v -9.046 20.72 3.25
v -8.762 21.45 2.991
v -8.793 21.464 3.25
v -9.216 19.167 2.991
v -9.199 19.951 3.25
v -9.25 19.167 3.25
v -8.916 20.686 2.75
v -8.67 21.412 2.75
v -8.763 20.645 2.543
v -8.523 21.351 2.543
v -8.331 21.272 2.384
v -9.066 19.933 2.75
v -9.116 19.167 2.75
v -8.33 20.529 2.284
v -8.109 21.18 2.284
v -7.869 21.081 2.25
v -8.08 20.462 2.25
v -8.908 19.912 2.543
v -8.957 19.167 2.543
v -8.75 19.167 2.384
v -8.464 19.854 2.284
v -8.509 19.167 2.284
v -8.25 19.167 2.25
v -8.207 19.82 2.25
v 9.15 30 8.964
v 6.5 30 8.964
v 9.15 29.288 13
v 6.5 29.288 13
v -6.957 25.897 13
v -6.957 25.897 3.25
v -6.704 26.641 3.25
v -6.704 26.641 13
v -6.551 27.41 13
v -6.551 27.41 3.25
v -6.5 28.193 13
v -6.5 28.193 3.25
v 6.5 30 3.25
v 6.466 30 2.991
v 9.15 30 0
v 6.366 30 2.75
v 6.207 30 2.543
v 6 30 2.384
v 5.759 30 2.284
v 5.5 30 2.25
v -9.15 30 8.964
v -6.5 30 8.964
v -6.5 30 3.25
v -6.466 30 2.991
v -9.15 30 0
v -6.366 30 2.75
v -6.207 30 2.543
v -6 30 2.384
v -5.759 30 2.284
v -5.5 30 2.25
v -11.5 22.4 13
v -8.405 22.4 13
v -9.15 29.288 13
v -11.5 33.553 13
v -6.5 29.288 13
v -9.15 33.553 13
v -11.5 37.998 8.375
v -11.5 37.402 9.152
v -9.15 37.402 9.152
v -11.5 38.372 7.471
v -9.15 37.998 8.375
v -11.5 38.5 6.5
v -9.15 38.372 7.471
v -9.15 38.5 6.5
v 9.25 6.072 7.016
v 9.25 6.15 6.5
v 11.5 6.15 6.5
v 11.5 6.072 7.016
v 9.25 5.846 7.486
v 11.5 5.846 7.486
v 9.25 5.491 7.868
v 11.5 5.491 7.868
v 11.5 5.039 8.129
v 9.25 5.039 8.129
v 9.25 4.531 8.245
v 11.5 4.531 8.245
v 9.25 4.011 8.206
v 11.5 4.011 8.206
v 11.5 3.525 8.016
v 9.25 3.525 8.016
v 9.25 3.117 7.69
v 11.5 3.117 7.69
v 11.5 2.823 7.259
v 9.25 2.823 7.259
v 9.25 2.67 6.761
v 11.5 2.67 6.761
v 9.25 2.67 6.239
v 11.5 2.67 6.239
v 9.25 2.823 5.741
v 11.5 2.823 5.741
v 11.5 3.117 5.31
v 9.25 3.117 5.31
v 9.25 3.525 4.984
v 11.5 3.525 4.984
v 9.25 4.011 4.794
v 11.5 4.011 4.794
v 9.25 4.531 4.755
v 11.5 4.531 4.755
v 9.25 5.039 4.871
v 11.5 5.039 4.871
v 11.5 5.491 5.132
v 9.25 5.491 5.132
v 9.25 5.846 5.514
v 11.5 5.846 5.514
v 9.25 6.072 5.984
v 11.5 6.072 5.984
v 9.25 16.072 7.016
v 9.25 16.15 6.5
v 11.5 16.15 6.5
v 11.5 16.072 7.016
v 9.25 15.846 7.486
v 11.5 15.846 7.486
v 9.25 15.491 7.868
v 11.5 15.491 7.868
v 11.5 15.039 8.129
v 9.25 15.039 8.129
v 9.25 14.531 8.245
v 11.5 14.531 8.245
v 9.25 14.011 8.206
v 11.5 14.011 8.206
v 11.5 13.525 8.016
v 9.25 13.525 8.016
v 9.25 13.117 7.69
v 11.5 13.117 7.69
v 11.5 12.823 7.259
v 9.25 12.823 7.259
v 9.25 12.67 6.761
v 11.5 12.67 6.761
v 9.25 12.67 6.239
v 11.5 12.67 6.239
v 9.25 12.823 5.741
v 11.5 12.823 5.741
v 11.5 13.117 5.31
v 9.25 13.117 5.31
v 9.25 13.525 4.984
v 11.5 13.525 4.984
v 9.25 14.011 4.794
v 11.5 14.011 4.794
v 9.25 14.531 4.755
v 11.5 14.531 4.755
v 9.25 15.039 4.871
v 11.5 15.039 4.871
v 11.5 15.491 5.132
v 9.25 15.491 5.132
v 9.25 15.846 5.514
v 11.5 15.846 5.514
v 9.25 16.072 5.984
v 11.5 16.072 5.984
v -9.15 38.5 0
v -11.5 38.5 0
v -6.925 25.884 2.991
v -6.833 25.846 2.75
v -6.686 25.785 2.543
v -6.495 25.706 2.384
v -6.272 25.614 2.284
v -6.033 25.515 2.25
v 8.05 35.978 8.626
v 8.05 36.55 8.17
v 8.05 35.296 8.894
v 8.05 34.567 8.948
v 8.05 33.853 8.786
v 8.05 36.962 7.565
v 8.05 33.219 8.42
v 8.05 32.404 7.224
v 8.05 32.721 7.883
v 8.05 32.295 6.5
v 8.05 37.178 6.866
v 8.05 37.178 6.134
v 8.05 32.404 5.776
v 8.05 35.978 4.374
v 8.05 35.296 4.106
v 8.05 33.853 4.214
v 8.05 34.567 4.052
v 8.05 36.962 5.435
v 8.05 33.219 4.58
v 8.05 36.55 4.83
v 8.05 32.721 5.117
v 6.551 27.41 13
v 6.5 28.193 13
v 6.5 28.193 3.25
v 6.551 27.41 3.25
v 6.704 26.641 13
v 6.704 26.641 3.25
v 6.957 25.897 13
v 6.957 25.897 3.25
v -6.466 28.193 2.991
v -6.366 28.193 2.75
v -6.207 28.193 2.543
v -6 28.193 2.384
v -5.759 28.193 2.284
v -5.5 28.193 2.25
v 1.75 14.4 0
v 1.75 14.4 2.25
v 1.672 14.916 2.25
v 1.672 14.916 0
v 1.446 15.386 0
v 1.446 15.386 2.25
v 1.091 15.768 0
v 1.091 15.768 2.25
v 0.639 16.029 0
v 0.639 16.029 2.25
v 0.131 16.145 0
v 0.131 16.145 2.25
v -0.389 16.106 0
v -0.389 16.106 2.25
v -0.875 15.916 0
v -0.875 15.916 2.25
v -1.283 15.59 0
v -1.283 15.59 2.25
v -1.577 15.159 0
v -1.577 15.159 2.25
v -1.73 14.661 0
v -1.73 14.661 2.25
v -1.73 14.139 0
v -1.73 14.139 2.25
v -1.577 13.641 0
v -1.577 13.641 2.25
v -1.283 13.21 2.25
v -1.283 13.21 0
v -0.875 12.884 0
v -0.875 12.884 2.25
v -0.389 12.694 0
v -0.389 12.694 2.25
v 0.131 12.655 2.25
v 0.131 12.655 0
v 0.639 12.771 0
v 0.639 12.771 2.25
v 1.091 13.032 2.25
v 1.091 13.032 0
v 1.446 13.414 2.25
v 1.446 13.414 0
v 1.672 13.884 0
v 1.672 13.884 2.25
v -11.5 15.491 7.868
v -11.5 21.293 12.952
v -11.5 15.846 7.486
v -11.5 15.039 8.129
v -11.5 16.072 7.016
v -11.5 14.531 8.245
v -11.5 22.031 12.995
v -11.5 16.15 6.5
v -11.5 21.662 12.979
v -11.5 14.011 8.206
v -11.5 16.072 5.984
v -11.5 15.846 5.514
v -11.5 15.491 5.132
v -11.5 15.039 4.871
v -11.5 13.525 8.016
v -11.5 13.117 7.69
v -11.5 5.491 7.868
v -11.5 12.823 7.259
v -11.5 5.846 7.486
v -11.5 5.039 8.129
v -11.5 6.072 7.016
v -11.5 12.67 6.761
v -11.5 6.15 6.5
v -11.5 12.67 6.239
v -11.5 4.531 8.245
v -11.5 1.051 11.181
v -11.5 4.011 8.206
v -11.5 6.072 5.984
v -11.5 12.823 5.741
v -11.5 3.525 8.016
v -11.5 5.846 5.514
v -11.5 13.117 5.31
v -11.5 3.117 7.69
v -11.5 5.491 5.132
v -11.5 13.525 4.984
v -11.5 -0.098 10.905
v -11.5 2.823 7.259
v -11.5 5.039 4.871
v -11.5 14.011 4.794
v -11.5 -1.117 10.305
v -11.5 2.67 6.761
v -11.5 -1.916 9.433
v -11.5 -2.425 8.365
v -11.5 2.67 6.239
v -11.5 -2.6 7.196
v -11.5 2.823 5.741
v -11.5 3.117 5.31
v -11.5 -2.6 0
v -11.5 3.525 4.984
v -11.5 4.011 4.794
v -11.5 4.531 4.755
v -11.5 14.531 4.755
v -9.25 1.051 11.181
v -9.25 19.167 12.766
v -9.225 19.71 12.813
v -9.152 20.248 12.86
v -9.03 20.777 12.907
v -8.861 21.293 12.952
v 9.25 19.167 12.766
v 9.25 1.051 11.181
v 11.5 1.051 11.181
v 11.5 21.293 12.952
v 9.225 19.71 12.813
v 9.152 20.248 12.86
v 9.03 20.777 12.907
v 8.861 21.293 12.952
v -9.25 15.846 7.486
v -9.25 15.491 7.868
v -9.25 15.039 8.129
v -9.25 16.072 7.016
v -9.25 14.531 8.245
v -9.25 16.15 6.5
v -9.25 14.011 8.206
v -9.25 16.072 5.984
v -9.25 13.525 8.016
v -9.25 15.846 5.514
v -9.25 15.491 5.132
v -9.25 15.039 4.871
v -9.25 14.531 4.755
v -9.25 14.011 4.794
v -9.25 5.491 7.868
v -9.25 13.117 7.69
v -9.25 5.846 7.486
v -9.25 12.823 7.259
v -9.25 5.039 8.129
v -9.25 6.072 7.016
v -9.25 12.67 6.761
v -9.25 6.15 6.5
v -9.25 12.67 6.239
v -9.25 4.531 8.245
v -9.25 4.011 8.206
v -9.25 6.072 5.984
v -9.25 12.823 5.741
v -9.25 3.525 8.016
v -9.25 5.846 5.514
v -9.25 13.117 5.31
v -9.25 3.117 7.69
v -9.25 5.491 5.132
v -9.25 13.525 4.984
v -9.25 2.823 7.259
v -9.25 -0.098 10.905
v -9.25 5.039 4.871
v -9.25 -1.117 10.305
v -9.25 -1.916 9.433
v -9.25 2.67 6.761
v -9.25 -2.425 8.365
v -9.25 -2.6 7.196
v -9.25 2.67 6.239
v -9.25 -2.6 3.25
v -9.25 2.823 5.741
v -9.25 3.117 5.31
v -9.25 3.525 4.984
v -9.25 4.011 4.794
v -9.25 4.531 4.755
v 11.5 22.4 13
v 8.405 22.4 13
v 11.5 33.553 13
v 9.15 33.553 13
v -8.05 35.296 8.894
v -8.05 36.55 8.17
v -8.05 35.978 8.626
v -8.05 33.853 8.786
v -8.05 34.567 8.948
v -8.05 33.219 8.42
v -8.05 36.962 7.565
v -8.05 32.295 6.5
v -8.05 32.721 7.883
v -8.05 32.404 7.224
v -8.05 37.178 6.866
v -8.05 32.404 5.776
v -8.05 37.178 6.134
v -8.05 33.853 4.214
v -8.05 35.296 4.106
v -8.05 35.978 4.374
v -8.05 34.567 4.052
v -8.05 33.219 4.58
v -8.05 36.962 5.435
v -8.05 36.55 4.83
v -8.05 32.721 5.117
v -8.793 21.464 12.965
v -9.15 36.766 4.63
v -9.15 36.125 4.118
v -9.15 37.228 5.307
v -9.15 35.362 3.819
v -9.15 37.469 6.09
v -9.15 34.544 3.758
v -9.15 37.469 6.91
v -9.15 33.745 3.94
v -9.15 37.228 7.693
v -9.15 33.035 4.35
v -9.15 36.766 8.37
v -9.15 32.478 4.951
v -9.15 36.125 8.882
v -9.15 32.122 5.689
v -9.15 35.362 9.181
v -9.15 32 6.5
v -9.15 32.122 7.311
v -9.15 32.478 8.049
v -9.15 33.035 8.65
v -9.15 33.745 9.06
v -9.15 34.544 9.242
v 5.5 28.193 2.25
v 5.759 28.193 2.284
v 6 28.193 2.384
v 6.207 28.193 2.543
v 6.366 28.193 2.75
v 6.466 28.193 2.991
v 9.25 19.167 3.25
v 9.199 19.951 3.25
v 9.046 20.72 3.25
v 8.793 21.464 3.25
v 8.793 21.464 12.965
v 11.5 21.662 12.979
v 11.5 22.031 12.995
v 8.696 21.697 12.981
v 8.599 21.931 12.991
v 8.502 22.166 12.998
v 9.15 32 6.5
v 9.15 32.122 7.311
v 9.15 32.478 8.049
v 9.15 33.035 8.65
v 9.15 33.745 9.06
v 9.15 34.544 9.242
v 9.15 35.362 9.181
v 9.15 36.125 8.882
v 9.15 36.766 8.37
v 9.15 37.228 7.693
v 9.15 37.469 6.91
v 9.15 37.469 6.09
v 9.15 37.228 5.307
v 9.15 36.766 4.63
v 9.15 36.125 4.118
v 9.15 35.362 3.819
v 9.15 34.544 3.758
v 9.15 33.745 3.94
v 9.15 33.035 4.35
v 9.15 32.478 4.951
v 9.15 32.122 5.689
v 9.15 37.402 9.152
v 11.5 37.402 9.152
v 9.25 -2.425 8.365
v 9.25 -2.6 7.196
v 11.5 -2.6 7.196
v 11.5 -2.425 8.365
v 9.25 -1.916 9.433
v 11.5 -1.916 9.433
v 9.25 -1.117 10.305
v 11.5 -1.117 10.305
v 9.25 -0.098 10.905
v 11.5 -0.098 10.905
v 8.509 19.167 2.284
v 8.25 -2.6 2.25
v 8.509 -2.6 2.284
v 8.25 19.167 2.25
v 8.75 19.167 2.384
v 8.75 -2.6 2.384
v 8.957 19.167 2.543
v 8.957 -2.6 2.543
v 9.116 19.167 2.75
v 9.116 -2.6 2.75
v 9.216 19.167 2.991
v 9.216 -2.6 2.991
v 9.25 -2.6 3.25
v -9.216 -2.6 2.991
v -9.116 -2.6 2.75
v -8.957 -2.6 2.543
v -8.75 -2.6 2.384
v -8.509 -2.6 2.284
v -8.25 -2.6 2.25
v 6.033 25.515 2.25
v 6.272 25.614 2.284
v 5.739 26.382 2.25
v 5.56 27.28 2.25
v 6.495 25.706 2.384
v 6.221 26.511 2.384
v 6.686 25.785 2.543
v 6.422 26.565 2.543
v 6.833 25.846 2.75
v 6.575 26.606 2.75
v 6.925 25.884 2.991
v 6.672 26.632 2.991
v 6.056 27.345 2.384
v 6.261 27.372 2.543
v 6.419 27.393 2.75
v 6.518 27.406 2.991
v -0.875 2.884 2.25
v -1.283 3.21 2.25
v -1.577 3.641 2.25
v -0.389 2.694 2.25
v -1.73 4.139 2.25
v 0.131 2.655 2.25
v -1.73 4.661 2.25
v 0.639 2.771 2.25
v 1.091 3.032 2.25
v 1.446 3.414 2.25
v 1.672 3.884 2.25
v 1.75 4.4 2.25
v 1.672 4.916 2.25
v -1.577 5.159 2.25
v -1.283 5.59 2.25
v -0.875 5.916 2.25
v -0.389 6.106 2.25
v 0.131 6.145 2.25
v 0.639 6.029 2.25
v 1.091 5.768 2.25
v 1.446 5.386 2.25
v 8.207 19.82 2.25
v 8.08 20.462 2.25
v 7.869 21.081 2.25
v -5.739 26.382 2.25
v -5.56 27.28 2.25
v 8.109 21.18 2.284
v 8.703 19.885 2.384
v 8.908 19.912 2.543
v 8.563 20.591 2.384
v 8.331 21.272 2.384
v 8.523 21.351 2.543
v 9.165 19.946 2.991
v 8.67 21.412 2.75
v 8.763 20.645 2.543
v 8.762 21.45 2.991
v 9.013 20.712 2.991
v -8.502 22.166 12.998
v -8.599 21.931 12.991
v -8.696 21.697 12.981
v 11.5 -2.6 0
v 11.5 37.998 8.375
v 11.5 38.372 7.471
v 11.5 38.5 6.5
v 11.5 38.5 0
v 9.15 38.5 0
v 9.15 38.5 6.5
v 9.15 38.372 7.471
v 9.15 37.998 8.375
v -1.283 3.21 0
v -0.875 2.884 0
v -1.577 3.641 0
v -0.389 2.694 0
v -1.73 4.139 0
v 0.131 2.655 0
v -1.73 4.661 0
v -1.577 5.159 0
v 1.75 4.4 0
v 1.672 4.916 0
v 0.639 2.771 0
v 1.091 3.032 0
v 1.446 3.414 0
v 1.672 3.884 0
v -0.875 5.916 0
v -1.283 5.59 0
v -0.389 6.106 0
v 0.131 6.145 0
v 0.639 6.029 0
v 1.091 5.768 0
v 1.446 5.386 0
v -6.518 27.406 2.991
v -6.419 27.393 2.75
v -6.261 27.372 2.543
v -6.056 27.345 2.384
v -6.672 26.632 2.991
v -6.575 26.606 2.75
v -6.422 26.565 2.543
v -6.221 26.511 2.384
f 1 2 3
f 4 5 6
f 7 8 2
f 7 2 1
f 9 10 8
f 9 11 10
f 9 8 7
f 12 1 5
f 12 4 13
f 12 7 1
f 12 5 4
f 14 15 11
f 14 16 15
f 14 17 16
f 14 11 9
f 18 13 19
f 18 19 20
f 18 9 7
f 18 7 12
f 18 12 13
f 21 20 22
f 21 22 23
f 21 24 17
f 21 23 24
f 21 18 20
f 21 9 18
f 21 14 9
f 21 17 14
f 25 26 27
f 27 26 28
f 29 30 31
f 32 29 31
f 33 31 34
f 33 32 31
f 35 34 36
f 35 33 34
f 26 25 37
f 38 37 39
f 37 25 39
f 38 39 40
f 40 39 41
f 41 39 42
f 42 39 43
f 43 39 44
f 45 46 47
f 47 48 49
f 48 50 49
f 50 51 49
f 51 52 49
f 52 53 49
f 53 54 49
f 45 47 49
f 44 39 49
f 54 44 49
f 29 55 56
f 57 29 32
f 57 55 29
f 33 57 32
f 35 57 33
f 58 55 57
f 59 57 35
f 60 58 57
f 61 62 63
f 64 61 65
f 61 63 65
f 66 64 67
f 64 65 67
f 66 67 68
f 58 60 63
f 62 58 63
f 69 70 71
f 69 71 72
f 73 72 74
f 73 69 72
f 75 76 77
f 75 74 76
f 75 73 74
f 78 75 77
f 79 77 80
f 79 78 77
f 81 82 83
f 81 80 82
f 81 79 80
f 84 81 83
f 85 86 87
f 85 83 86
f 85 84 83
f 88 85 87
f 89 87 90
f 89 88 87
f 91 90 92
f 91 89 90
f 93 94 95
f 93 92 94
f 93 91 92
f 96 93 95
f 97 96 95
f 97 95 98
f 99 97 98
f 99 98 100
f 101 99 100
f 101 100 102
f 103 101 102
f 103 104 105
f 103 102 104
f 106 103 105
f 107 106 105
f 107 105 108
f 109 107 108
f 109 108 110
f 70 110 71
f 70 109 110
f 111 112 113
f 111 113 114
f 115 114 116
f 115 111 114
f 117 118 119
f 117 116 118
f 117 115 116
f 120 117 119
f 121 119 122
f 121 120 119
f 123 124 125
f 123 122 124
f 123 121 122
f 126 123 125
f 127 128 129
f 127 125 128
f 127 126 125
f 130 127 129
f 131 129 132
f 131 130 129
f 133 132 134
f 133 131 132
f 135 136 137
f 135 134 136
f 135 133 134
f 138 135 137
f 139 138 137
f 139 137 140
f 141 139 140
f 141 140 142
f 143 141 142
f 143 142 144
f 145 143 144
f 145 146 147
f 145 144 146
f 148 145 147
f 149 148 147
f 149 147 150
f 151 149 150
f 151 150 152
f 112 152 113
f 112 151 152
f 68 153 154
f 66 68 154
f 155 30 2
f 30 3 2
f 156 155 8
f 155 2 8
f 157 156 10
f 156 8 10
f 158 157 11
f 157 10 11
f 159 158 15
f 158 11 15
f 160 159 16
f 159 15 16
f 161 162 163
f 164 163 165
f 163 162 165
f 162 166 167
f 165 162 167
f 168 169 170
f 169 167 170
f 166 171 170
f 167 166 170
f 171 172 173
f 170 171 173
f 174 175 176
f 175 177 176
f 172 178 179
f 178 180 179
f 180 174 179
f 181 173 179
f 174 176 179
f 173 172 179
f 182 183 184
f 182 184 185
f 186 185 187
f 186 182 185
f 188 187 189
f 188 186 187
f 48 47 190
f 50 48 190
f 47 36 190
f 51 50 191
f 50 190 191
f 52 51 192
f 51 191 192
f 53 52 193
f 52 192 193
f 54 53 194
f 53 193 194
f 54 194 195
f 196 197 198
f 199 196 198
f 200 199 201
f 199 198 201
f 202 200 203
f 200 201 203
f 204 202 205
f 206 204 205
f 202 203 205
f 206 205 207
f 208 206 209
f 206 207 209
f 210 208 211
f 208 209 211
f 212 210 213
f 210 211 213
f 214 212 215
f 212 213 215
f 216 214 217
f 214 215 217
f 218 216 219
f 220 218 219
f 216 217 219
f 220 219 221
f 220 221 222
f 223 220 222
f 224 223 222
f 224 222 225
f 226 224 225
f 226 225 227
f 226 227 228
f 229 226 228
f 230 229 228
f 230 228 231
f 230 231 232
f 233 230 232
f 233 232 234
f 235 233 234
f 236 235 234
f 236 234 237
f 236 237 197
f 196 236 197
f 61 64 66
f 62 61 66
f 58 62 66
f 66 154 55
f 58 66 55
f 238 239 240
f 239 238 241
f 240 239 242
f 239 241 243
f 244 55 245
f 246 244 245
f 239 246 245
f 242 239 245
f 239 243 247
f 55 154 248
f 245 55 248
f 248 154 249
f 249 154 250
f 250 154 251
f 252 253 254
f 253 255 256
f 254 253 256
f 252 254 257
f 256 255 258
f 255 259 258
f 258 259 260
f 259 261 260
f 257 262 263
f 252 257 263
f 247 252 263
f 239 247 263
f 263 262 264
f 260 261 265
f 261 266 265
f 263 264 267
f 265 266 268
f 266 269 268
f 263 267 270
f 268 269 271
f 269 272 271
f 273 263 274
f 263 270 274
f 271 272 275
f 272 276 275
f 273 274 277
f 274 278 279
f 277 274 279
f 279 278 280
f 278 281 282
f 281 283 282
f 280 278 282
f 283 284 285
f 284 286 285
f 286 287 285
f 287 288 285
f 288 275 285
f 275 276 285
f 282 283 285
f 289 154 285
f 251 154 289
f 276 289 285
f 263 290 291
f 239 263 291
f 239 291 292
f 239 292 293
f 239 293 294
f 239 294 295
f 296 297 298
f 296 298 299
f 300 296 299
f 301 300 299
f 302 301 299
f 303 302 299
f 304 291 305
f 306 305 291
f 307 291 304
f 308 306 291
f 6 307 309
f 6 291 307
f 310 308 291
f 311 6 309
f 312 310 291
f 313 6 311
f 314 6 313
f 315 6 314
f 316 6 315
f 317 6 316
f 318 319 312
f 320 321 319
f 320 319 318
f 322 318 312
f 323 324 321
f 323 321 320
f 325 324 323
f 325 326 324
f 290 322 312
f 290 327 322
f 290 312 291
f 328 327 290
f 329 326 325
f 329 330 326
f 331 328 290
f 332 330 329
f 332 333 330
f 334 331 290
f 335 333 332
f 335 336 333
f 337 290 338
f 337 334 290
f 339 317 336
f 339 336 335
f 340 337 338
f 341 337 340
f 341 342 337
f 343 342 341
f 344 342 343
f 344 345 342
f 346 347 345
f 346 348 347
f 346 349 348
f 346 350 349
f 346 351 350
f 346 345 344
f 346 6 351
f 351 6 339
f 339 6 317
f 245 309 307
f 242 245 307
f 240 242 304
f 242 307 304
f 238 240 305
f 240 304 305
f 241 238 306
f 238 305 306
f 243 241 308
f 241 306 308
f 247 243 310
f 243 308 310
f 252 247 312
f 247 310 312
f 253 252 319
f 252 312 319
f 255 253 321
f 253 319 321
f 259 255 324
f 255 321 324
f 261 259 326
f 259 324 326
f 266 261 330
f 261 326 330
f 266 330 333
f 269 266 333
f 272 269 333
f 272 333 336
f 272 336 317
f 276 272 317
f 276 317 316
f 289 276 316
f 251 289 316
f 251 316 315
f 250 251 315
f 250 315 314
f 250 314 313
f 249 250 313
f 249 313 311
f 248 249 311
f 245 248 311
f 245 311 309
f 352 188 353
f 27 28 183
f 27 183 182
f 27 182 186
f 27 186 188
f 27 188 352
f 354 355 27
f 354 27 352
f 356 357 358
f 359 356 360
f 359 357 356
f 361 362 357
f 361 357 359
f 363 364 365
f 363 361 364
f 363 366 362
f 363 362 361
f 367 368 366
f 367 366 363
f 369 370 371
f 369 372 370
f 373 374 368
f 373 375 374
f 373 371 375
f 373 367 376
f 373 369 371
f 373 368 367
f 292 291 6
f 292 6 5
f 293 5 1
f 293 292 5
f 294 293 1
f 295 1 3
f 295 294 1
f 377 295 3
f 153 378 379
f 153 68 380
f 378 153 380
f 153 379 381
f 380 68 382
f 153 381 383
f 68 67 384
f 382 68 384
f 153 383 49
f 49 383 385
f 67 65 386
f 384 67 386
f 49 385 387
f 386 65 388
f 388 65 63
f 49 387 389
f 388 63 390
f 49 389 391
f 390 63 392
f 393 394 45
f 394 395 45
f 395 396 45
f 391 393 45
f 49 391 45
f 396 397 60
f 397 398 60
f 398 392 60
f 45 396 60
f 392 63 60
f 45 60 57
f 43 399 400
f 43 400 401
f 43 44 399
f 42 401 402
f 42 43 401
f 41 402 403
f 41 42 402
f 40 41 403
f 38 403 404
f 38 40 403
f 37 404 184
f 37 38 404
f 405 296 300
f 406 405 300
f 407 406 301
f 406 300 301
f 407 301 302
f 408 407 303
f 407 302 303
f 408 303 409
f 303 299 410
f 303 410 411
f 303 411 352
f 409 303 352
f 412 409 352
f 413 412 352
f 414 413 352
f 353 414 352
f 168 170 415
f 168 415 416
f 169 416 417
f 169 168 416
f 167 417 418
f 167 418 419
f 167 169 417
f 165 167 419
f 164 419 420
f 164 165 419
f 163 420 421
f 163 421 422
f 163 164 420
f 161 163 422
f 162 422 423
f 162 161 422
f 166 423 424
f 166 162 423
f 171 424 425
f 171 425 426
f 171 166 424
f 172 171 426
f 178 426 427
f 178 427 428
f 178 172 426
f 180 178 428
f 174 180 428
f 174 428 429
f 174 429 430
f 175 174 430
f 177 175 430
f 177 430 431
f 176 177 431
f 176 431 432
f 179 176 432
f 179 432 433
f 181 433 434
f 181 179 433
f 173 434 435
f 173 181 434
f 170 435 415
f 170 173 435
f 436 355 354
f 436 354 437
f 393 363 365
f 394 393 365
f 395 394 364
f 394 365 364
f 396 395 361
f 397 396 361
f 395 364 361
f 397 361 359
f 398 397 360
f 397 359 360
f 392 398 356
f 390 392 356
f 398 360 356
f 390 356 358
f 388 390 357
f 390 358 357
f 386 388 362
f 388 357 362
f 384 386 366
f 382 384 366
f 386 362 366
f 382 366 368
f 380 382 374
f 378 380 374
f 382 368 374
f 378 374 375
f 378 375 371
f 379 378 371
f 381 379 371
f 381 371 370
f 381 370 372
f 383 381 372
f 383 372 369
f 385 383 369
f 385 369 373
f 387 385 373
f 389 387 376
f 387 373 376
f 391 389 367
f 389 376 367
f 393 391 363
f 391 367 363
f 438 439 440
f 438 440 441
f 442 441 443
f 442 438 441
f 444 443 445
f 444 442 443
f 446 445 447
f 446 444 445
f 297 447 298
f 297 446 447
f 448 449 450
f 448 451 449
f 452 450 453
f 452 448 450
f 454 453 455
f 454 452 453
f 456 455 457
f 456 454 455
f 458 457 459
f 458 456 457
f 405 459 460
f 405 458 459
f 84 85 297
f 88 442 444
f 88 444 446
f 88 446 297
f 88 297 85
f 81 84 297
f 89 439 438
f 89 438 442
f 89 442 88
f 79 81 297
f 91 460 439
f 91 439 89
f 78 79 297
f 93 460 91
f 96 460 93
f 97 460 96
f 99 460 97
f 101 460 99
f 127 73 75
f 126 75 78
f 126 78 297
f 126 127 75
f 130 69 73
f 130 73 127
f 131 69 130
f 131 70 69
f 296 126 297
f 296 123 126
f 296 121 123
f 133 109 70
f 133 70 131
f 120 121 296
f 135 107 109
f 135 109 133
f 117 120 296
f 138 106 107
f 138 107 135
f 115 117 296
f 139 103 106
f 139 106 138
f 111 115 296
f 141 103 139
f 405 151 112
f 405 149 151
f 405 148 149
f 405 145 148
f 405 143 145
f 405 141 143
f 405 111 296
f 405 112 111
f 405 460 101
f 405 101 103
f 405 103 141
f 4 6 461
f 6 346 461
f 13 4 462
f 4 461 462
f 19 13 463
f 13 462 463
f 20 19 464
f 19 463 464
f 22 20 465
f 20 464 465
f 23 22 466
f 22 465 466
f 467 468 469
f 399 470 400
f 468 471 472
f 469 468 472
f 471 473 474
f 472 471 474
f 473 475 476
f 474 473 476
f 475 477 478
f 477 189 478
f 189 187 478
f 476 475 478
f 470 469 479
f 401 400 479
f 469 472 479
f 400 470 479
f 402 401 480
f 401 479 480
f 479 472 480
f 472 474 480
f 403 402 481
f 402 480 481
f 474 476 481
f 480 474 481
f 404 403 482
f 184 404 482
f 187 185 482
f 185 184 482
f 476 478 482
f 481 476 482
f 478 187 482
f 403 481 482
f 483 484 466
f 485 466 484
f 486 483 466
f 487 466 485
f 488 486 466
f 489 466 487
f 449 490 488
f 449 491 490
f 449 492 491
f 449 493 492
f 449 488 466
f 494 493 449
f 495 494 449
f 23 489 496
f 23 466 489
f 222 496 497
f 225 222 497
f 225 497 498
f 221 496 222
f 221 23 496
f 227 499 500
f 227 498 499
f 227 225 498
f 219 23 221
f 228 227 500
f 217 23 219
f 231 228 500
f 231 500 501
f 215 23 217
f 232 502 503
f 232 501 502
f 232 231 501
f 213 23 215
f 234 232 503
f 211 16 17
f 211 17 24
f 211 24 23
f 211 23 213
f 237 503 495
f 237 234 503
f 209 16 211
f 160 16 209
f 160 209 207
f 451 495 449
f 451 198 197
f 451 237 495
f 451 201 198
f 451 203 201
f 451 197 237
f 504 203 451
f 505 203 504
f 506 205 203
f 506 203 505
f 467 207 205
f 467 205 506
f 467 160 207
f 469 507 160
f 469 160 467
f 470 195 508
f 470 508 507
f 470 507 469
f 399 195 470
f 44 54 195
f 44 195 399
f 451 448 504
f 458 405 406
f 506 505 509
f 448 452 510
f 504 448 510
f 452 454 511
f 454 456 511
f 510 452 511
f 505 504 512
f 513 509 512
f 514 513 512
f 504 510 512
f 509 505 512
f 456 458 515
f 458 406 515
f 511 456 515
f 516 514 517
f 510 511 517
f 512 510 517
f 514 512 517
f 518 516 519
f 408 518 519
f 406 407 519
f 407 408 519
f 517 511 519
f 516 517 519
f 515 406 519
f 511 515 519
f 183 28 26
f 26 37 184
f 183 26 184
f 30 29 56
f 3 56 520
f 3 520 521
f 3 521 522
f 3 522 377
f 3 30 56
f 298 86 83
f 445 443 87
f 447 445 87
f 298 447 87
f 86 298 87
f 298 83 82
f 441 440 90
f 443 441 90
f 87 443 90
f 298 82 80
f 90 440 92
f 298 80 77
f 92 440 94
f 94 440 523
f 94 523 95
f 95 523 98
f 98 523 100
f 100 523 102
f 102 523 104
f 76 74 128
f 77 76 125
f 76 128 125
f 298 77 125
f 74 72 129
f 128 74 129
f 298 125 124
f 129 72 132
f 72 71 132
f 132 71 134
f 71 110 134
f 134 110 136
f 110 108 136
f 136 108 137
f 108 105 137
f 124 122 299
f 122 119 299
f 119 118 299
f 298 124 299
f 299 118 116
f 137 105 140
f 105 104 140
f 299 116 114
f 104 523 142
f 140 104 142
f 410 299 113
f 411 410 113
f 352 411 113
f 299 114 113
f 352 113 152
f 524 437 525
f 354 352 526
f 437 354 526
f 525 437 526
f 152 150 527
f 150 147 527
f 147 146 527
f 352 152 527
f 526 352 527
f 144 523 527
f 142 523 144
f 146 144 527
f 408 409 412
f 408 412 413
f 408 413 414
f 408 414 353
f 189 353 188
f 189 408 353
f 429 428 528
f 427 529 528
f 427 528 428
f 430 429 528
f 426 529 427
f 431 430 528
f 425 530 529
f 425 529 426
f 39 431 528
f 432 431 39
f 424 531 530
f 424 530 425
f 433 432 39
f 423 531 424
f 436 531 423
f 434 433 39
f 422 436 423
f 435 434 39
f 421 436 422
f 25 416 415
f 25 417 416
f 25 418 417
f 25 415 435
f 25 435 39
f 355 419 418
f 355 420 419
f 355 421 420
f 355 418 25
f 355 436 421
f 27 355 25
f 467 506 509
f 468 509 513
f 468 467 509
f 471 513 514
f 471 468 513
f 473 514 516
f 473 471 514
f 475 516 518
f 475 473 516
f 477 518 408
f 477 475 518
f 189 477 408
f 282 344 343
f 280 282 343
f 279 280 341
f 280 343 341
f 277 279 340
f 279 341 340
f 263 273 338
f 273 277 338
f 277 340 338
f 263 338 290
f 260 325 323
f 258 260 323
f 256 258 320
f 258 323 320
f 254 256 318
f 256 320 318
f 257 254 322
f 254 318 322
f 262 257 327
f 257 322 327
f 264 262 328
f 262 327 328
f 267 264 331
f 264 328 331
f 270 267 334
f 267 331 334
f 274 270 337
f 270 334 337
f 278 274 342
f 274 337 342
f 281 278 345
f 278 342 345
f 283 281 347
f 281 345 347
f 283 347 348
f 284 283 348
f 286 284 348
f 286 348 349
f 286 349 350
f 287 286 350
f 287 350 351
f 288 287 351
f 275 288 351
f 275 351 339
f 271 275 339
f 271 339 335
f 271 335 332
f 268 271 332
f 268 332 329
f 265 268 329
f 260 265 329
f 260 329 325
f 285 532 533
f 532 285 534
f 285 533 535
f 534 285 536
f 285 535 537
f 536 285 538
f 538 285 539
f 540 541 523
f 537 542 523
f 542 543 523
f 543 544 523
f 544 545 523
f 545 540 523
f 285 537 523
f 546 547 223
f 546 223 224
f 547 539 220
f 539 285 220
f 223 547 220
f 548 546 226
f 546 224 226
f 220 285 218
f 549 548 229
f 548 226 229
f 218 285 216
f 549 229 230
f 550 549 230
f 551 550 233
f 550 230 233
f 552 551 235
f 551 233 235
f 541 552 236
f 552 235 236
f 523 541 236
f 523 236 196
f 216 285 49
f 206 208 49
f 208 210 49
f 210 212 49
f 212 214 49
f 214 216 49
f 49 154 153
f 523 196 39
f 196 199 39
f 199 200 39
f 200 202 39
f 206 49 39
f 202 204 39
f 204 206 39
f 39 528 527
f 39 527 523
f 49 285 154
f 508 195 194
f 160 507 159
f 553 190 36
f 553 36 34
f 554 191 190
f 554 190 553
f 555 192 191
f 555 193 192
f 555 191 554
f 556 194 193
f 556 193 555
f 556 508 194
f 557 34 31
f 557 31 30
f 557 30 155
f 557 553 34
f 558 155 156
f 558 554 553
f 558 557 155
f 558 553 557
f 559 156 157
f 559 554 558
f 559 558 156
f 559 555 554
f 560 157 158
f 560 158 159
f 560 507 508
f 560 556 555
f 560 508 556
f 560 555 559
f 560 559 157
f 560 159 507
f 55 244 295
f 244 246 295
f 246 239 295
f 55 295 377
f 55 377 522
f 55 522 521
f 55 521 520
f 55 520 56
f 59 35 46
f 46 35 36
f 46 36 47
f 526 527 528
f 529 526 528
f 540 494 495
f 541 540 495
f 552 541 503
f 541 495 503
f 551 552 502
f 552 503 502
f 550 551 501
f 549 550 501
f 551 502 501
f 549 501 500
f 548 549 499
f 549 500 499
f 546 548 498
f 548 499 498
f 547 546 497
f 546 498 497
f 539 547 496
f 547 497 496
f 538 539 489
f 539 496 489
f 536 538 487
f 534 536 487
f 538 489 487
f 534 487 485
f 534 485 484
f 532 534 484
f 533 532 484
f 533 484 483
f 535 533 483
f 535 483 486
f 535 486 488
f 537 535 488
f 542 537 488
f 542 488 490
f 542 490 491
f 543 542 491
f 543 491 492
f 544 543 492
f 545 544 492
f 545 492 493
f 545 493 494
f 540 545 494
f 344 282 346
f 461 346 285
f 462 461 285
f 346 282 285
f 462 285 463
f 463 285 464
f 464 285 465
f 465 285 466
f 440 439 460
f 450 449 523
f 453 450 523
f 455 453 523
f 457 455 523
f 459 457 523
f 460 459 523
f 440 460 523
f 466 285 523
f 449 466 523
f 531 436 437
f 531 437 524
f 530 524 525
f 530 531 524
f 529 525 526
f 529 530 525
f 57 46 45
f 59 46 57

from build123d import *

# Parameters (mm, degrees)
F1_DEPTH      = 13
F2_W          = 13
F2_H          = 10.75
F3_DEPTH      = 38.501
F4_R          = 1.75
F5_DEPTH      = 11.501
F5_DEPTH_BACK = 11.501
F6_R          = 2.75
F7_DEPTH      = 2.65
F8_DEPTH      = 1.55
F8_DEPTH_BACK = 14.55
F9_SIZE2      = 0.294734
F9_SIZE       = 1.09999
F10_DEPTH     = 2.6
F12_DEPTH     = 10.751
F13_R         = 6
F14_R         = 1
F15_R         = 1.75
F16_DEPTH     = 2.251


# Not quite as in the source:
# - a fillet or chamfer is up to 0.001 mm smaller than in the source, because OpenCascade refuses the exact size
# - a pattern or mirror of a feature is missing from the dataset's text; its kind, count and spacing are read off the source's solid


with BuildPart() as f1:
    # F0 (on Top) → F1 (new body)
    with BuildSketch(Plane.XY):
        Polygon((6.5, 30), (0, 30), (-6.5, 30), (-6.5, 38.5), (-11.5, 38.5), (-11.5, -2.6), (-6.5, -2.6), (-6.5, 0), (0, 0), (6.5, 0), (6.5, -2.6), (11.5, -2.6), (11.5, 38.5), (6.5, 38.5), align=None)
    extrude(amount=F1_DEPTH)

    # F2 (on Front) → F3 (cut, through all)
    with BuildSketch(Plane.XZ):
        with Locations((0, 7.625)):
            Rectangle(F2_W, F2_H)
    extrude(amount=-F3_DEPTH, mode=Mode.SUBTRACT)

    # F4 (on Right) → F5 (cut, two sides)
    with BuildSketch(Plane.YZ) as f5_sk:
        with BuildLine():
            Line((38.5, 6.5), (38.5, 13))
            Line((38.5, 13), (33.5533008589, 13))
            Line((33.5533008589, 13), (37.4016504294, 9.1516504294))
            ThreePointArc((37.4016504294, 9.1516504294), (38.2145482469, 7.9350628714), (38.5, 6.5))
        make_face()
        with Locations((4.4, 6.5)):
            Circle(F4_R)
        with Locations((14.4, 6.5)):
            Circle(F4_R)
        with BuildLine():
            ThreePointArc((21.2931220671, 12.9516726658), (21.8460337805, 12.9879124141), (22.4, 13))
            Line((22.4, 13), (-2.6, 13))
            Line((-2.6, 13), (-2.6, 7.1959706526))
            ThreePointArc((-2.6, 7.1959706526), (-1.5491093472, 9.898331483), (1.051377029, 11.1807494449))
            Line((1.051377029, 11.1807494449), (21.2931220671, 12.9516726658))
        make_face()
    extrude(amount=-F5_DEPTH, mode=Mode.SUBTRACT)
    extrude(f5_sk.sketch, amount=F5_DEPTH_BACK, mode=Mode.SUBTRACT)

    # F6 (on face) → F7 (cut)
    with BuildSketch(Plane(origin=(6.5, 0, 0), x_dir=(0, -1, 0), z_dir=(-1, 0, 0))):
        with BuildLine():
            Line((-38.5, 0), (-30, 0))
            Line((-30, 0), (-30, 8.9638140898))
            Line((-30, 8.9638140898), (-29.2883115249, 13))
            Line((-29.2883115249, 13), (-33.5533008589, 13))
            Line((-33.5533008589, 13), (-37.4016504294, 9.1516504294))
            ThreePointArc((-37.4016504294, 9.1516504294), (-38.2145482469, 7.9350628714), (-38.5, 6.5))
            Line((-38.5, 6.5), (-38.5, 0))
        make_face()
        with Locations((-34.75, 6.5)):
            Circle(F6_R, mode=Mode.SUBTRACT)
    f7 = extrude(amount=-F7_DEPTH, mode=Mode.SUBTRACT)

    # F7_copies: F7 across plane
    add(f7.mirror(Plane(origin=(0, 0, 0), x_dir=(0, 0, -1), z_dir=(-1, 0, 0))), mode=Mode.SUBTRACT)

    # F8 (cut, two sides): a face of the model
    f8_faces = [f1.faces().sort_by_distance(p)[0] for p in [
        (6.5, 34.75, 6.5),
    ]]
    extrude(f8_faces, amount=-F8_DEPTH, mode=Mode.SUBTRACT)
    extrude(f8_faces, amount=F8_DEPTH_BACK, mode=Mode.SUBTRACT)

    # F9 (size 1.1 and 0.2947441117 in the source; OpenCascade refuses exactly that, so slightly less here)
    f9_edges = [f1.edges().sort_by_distance(p)[0] for p in [
        (8.05, 37.5, 6.5),
        (-8.05, 37.5, 6.5),
    ]]
    chamfer(f9_edges, length=F9_SIZE, length2=F9_SIZE2)

    # F10 (add, through all): a face of the model
    f10_faces = [f1.faces().sort_by_distance(p)[0] for p in [
        (0, 0, 1.125),
    ]]
    extrude(f10_faces, amount=F10_DEPTH)

    # F11 (on face) → F12 (cut, through all)
    with BuildSketch(Plane.XY.offset(2.25)):
        Polygon((-9.25, -2.6), (9.25, -2.6), (9.25, 20.3609127035), (6.5, 27), (-6.5, 27), (-9.25, 20.3609127035), align=None)
    extrude(amount=F12_DEPTH, mode=Mode.SUBTRACT)

    # F13
    f13_edges = [f1.edges().sort_by_distance(p)[0] for p in [
        (6.5, 27, 7.625),
        (9.25, 20.360913, 7.560057),
        (-6.5, 27, 7.625),
        (-9.25, 20.360913, 7.560057),
    ]]
    fillet(f13_edges, radius=F13_R)

    # F14
    f14_edges = [f1.edges().sort_by_distance(p)[0] for p in [
        (9.25, 8.283719, 2.25),
        (-9.25, 8.283719, 2.25),
        (6.5, 29.096737, 2.25),
        (6.615288, 27.022932, 2.25),
        (7.875, 23.680456, 2.25),
        (-6.5, 29.096737, 2.25),
        (9.134712, 20.33798, 2.25),
        (-6.615288, 27.022932, 2.25),
        (-7.875, 23.680456, 2.25),
        (-9.134712, 20.33798, 2.25),
    ]]
    fillet(f14_edges, radius=F14_R)

    # F15 (on face) → F16 (cut, through all)
    with BuildSketch(Plane.XY.offset(2.25)):
        with Locations((0, 4.4)):
            Circle(F15_R)
        with Locations((0, 14.4)):
            Circle(F15_R)
    extrude(amount=-F16_DEPTH, mode=Mode.SUBTRACT)


solid = f1.part
